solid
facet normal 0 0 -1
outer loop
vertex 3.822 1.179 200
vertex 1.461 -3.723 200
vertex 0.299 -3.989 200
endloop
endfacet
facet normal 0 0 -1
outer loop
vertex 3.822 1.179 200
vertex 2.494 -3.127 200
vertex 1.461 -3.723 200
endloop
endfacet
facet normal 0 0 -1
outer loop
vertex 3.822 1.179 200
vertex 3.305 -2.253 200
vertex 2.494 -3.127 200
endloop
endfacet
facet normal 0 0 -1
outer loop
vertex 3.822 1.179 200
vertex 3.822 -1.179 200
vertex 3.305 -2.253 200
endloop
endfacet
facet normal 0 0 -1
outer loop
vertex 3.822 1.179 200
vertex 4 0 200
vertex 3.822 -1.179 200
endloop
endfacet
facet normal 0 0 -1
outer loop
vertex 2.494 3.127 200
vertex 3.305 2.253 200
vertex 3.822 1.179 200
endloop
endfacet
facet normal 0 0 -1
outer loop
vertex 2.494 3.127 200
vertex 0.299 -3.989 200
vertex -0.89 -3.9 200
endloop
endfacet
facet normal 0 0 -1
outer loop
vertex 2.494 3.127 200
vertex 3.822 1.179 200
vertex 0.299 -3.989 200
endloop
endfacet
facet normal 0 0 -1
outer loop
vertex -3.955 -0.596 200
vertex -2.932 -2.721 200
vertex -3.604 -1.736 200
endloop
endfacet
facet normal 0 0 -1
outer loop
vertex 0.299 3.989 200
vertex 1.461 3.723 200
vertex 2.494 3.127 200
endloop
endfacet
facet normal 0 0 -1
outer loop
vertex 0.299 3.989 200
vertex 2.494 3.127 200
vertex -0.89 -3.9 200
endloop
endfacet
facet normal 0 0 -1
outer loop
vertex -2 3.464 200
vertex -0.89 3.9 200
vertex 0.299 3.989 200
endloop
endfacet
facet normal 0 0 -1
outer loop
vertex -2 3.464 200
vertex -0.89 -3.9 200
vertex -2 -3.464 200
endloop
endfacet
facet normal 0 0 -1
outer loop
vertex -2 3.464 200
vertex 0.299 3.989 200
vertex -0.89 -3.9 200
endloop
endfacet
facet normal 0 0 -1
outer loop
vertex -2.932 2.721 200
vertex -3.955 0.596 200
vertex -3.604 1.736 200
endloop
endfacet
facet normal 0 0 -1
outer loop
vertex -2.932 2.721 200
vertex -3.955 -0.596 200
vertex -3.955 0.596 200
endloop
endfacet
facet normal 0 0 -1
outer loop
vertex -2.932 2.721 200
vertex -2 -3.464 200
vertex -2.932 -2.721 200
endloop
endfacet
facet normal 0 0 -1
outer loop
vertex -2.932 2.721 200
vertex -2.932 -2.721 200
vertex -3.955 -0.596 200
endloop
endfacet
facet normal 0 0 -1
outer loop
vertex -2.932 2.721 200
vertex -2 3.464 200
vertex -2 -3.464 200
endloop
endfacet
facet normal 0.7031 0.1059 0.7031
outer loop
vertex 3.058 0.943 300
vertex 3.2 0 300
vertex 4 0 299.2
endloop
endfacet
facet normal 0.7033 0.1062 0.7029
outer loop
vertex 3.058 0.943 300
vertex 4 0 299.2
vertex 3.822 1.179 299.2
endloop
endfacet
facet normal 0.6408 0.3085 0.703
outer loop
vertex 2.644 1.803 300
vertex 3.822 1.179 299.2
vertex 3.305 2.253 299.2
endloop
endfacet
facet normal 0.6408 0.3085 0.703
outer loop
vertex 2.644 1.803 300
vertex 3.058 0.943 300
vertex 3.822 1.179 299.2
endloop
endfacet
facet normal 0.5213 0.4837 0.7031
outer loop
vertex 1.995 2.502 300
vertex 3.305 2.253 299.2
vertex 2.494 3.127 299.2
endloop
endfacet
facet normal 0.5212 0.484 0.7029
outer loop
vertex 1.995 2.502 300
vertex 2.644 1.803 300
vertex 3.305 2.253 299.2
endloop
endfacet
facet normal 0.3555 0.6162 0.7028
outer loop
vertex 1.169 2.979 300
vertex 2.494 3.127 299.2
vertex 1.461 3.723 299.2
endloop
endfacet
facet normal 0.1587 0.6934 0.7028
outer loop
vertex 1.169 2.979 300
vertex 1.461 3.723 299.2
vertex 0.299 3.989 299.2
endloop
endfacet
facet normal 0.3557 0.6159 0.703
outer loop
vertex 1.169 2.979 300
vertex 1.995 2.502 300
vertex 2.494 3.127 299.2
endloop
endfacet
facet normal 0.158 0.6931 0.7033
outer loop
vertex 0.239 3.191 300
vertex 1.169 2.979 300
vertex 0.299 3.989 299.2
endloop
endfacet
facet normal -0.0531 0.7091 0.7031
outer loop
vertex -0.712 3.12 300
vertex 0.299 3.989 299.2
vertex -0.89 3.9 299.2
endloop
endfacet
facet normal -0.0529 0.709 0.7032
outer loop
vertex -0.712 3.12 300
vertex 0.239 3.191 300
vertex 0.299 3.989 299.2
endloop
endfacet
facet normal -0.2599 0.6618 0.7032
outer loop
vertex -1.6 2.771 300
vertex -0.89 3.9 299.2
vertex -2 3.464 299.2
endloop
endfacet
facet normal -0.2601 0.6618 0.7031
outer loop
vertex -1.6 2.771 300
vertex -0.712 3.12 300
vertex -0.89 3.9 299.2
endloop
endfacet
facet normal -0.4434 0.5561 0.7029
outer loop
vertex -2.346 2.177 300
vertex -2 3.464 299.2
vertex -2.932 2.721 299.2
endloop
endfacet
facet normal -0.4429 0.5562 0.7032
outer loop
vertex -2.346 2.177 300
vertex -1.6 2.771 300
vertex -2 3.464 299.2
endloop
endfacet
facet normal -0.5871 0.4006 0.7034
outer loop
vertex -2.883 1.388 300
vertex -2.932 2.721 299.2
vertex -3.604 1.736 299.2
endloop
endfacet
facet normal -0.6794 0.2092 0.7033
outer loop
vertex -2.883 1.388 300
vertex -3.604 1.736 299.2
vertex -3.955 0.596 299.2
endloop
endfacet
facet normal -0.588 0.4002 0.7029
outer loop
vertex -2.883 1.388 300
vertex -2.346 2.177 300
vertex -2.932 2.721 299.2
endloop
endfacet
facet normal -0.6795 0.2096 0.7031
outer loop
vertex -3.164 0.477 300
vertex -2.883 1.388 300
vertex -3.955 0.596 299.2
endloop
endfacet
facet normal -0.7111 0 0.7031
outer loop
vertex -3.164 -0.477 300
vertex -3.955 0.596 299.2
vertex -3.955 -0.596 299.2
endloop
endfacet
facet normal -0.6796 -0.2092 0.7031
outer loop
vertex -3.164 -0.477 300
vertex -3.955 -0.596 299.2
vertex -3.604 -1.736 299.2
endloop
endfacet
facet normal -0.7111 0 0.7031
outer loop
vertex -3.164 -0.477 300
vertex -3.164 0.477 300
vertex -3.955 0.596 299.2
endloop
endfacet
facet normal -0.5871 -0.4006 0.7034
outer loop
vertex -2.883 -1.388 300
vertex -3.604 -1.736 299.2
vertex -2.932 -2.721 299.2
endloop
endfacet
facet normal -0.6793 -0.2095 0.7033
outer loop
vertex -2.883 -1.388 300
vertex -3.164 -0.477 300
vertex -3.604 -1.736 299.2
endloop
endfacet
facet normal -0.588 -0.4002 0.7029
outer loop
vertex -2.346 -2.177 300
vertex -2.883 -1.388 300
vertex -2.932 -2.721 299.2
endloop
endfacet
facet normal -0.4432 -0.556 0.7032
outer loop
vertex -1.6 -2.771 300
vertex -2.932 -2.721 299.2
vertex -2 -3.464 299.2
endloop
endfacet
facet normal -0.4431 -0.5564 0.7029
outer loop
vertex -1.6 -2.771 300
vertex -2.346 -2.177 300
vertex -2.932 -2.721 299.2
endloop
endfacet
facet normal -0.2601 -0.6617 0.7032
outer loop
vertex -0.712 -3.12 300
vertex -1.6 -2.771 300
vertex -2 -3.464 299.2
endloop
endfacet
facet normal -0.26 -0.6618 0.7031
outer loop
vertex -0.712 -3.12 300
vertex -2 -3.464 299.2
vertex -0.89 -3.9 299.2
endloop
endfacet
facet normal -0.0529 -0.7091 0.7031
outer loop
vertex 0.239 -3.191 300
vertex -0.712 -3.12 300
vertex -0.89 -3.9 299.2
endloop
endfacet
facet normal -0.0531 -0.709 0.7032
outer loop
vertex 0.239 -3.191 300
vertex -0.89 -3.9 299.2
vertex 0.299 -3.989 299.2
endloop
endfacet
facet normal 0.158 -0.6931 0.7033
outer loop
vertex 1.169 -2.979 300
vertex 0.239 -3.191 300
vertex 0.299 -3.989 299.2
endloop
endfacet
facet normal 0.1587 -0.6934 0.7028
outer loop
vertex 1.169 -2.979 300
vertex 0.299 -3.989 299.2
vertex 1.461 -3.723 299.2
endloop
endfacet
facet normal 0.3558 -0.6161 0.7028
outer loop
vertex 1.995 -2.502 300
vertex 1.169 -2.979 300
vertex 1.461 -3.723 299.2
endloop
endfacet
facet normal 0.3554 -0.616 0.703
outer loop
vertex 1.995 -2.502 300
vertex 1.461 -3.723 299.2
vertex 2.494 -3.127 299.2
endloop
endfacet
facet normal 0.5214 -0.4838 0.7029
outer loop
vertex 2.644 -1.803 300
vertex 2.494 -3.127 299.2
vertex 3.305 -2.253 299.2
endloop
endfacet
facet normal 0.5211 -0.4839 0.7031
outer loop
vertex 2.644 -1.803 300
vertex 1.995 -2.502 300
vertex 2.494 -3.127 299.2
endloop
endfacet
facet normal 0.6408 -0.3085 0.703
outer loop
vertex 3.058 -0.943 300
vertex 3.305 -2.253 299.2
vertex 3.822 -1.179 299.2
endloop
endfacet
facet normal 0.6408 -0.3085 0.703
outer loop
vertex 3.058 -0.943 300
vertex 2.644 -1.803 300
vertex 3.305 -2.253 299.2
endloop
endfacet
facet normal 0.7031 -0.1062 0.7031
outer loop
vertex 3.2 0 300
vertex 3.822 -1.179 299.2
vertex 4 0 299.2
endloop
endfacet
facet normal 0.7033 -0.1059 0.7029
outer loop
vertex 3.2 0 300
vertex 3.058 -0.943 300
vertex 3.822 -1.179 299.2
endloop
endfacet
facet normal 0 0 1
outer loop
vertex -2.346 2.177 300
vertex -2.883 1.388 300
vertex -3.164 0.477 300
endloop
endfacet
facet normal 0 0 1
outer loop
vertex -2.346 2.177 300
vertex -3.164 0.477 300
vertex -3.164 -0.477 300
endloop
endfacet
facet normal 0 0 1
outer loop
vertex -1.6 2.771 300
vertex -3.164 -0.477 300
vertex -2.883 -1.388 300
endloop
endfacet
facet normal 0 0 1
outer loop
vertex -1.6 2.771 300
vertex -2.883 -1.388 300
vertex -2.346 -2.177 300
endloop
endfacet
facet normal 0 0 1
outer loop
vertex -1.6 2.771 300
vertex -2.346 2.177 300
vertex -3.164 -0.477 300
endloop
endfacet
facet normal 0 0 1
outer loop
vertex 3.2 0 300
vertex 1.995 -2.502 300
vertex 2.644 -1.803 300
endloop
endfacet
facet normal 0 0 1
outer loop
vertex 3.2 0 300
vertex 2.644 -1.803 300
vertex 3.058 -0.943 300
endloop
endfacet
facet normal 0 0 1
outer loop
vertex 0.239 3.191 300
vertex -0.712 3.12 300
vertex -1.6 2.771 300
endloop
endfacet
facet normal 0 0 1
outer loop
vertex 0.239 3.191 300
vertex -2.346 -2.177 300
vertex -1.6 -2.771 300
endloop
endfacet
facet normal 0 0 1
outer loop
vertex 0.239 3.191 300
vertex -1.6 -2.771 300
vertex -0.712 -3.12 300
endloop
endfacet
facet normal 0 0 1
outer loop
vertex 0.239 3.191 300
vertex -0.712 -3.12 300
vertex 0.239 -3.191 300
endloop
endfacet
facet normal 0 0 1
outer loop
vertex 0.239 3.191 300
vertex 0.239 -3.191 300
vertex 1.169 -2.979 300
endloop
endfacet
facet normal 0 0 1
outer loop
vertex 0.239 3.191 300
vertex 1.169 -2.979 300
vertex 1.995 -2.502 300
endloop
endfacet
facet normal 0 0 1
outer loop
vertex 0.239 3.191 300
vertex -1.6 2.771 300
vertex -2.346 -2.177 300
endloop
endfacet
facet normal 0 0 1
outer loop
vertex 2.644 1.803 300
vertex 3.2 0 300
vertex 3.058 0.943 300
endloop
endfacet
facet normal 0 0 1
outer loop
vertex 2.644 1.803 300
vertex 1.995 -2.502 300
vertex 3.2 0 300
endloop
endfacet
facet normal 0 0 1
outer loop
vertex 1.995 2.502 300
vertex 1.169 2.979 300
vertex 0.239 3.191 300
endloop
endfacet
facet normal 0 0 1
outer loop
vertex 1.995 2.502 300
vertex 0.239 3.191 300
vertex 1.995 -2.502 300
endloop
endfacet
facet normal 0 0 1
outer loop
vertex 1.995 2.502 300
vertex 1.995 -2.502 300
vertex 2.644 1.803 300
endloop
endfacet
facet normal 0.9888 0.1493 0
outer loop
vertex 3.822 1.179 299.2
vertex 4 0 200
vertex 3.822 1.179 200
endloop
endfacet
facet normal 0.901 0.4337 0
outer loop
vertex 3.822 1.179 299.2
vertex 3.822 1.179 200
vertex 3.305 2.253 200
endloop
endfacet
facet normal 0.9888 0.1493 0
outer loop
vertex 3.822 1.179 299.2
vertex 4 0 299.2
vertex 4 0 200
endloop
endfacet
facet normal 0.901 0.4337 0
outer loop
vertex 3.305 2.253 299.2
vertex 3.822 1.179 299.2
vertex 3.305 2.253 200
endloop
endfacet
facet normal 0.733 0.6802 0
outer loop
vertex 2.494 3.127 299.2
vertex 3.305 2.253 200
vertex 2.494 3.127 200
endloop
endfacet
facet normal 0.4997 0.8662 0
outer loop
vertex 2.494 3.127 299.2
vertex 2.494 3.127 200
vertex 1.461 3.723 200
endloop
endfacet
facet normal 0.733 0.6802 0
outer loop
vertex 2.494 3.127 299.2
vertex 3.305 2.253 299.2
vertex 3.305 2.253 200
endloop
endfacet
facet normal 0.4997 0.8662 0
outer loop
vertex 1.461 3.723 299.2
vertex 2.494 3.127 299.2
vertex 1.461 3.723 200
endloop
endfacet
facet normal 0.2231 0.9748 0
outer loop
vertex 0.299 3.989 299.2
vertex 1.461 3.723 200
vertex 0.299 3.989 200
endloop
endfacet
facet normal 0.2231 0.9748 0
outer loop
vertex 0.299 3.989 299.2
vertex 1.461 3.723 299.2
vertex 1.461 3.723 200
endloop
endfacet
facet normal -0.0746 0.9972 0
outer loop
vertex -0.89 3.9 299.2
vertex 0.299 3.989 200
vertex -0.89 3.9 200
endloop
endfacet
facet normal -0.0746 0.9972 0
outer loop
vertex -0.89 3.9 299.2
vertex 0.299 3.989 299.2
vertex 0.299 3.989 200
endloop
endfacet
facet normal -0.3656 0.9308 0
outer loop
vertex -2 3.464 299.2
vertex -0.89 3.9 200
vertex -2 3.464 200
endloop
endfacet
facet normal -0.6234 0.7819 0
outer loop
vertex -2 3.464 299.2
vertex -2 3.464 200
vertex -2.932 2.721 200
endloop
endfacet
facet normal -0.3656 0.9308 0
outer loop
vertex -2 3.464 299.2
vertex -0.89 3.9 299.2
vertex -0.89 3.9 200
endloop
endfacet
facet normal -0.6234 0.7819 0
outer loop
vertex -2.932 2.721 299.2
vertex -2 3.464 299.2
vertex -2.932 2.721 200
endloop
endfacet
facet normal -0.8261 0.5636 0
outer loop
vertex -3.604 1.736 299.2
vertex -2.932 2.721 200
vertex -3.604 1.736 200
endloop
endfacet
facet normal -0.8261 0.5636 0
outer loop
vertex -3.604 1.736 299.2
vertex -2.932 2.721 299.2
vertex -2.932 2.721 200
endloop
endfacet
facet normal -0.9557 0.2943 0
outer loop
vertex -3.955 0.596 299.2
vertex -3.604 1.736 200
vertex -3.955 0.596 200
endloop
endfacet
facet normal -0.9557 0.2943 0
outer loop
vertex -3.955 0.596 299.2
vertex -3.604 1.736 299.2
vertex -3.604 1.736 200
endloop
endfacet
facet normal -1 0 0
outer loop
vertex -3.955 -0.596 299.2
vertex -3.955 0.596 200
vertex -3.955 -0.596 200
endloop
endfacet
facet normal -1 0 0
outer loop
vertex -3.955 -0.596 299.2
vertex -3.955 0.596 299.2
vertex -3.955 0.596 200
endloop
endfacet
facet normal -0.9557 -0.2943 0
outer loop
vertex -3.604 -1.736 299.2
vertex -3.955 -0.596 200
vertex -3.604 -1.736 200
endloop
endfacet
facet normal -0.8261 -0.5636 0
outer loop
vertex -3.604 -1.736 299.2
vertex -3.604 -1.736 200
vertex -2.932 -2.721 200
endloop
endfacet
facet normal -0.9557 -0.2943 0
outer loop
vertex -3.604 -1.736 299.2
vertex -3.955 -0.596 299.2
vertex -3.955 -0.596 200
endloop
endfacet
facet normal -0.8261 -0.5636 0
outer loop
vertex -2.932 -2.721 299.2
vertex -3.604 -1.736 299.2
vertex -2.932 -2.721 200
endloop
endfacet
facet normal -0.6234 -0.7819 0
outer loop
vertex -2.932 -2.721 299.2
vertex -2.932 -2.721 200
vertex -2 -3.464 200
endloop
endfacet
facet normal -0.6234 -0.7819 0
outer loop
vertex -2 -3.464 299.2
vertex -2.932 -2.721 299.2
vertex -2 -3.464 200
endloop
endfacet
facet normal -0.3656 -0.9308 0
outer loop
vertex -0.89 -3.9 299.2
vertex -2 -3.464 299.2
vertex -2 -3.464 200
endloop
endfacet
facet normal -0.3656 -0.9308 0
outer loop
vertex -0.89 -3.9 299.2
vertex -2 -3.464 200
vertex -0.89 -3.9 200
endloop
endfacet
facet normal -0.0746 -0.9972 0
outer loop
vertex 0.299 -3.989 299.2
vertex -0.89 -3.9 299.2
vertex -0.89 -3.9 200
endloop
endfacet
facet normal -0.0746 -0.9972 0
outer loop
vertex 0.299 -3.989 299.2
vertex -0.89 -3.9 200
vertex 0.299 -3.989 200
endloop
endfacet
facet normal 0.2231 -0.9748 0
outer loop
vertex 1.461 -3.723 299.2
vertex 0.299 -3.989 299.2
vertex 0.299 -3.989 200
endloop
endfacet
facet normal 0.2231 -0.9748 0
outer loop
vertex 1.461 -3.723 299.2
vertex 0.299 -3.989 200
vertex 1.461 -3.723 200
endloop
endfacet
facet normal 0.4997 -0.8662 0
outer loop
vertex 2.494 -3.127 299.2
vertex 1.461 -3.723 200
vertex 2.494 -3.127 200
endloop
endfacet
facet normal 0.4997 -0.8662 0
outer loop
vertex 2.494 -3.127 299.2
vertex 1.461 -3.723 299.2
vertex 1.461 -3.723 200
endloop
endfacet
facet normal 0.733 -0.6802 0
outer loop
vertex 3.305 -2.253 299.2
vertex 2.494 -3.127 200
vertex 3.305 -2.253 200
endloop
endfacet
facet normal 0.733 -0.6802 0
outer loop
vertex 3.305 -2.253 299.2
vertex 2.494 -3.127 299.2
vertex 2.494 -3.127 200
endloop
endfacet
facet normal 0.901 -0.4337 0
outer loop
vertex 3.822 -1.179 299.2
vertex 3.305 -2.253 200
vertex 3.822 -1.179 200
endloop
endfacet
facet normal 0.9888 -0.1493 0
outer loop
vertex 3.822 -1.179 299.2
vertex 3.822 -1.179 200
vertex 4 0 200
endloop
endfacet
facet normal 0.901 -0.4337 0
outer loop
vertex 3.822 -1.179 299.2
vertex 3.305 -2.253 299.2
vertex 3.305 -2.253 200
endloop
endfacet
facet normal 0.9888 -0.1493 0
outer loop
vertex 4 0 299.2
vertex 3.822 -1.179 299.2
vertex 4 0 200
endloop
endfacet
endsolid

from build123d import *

# Parameters (mm, degrees)
SKETCH1_R          = 4
EXTRUDE1_DEPTH     = 300
CHAMFER1_SIZE      = 0.8
SKETCH3_R          = 12.756821692
CUT_EXTRUDE1_DEPTH = 500


with BuildPart() as part:
    # Sketch1 → Extrude1 (new, symmetric)
    with BuildSketch(Plane.XY):
        Circle(SKETCH1_R)
    extrude(amount=EXTRUDE1_DEPTH, both=True)

    # Chamfer1
    chamfer1_edges = [part.edges().sort_by_distance(p)[0] for p in [
        (-4, 0, -300),
        (-4, 0, 300),
    ]]
    chamfer(chamfer1_edges, length=CHAMFER1_SIZE)

    # Sketch3 → Cut-Extrude1 (cut)
    with BuildSketch(Plane(origin=(0, 0, -300), x_dir=(-1, 0, 0), z_dir=(0, 0, -1))):
        Circle(SKETCH3_R)
    extrude(amount=-CUT_EXTRUDE1_DEPTH, mode=Mode.SUBTRACT)


solid = part.part
